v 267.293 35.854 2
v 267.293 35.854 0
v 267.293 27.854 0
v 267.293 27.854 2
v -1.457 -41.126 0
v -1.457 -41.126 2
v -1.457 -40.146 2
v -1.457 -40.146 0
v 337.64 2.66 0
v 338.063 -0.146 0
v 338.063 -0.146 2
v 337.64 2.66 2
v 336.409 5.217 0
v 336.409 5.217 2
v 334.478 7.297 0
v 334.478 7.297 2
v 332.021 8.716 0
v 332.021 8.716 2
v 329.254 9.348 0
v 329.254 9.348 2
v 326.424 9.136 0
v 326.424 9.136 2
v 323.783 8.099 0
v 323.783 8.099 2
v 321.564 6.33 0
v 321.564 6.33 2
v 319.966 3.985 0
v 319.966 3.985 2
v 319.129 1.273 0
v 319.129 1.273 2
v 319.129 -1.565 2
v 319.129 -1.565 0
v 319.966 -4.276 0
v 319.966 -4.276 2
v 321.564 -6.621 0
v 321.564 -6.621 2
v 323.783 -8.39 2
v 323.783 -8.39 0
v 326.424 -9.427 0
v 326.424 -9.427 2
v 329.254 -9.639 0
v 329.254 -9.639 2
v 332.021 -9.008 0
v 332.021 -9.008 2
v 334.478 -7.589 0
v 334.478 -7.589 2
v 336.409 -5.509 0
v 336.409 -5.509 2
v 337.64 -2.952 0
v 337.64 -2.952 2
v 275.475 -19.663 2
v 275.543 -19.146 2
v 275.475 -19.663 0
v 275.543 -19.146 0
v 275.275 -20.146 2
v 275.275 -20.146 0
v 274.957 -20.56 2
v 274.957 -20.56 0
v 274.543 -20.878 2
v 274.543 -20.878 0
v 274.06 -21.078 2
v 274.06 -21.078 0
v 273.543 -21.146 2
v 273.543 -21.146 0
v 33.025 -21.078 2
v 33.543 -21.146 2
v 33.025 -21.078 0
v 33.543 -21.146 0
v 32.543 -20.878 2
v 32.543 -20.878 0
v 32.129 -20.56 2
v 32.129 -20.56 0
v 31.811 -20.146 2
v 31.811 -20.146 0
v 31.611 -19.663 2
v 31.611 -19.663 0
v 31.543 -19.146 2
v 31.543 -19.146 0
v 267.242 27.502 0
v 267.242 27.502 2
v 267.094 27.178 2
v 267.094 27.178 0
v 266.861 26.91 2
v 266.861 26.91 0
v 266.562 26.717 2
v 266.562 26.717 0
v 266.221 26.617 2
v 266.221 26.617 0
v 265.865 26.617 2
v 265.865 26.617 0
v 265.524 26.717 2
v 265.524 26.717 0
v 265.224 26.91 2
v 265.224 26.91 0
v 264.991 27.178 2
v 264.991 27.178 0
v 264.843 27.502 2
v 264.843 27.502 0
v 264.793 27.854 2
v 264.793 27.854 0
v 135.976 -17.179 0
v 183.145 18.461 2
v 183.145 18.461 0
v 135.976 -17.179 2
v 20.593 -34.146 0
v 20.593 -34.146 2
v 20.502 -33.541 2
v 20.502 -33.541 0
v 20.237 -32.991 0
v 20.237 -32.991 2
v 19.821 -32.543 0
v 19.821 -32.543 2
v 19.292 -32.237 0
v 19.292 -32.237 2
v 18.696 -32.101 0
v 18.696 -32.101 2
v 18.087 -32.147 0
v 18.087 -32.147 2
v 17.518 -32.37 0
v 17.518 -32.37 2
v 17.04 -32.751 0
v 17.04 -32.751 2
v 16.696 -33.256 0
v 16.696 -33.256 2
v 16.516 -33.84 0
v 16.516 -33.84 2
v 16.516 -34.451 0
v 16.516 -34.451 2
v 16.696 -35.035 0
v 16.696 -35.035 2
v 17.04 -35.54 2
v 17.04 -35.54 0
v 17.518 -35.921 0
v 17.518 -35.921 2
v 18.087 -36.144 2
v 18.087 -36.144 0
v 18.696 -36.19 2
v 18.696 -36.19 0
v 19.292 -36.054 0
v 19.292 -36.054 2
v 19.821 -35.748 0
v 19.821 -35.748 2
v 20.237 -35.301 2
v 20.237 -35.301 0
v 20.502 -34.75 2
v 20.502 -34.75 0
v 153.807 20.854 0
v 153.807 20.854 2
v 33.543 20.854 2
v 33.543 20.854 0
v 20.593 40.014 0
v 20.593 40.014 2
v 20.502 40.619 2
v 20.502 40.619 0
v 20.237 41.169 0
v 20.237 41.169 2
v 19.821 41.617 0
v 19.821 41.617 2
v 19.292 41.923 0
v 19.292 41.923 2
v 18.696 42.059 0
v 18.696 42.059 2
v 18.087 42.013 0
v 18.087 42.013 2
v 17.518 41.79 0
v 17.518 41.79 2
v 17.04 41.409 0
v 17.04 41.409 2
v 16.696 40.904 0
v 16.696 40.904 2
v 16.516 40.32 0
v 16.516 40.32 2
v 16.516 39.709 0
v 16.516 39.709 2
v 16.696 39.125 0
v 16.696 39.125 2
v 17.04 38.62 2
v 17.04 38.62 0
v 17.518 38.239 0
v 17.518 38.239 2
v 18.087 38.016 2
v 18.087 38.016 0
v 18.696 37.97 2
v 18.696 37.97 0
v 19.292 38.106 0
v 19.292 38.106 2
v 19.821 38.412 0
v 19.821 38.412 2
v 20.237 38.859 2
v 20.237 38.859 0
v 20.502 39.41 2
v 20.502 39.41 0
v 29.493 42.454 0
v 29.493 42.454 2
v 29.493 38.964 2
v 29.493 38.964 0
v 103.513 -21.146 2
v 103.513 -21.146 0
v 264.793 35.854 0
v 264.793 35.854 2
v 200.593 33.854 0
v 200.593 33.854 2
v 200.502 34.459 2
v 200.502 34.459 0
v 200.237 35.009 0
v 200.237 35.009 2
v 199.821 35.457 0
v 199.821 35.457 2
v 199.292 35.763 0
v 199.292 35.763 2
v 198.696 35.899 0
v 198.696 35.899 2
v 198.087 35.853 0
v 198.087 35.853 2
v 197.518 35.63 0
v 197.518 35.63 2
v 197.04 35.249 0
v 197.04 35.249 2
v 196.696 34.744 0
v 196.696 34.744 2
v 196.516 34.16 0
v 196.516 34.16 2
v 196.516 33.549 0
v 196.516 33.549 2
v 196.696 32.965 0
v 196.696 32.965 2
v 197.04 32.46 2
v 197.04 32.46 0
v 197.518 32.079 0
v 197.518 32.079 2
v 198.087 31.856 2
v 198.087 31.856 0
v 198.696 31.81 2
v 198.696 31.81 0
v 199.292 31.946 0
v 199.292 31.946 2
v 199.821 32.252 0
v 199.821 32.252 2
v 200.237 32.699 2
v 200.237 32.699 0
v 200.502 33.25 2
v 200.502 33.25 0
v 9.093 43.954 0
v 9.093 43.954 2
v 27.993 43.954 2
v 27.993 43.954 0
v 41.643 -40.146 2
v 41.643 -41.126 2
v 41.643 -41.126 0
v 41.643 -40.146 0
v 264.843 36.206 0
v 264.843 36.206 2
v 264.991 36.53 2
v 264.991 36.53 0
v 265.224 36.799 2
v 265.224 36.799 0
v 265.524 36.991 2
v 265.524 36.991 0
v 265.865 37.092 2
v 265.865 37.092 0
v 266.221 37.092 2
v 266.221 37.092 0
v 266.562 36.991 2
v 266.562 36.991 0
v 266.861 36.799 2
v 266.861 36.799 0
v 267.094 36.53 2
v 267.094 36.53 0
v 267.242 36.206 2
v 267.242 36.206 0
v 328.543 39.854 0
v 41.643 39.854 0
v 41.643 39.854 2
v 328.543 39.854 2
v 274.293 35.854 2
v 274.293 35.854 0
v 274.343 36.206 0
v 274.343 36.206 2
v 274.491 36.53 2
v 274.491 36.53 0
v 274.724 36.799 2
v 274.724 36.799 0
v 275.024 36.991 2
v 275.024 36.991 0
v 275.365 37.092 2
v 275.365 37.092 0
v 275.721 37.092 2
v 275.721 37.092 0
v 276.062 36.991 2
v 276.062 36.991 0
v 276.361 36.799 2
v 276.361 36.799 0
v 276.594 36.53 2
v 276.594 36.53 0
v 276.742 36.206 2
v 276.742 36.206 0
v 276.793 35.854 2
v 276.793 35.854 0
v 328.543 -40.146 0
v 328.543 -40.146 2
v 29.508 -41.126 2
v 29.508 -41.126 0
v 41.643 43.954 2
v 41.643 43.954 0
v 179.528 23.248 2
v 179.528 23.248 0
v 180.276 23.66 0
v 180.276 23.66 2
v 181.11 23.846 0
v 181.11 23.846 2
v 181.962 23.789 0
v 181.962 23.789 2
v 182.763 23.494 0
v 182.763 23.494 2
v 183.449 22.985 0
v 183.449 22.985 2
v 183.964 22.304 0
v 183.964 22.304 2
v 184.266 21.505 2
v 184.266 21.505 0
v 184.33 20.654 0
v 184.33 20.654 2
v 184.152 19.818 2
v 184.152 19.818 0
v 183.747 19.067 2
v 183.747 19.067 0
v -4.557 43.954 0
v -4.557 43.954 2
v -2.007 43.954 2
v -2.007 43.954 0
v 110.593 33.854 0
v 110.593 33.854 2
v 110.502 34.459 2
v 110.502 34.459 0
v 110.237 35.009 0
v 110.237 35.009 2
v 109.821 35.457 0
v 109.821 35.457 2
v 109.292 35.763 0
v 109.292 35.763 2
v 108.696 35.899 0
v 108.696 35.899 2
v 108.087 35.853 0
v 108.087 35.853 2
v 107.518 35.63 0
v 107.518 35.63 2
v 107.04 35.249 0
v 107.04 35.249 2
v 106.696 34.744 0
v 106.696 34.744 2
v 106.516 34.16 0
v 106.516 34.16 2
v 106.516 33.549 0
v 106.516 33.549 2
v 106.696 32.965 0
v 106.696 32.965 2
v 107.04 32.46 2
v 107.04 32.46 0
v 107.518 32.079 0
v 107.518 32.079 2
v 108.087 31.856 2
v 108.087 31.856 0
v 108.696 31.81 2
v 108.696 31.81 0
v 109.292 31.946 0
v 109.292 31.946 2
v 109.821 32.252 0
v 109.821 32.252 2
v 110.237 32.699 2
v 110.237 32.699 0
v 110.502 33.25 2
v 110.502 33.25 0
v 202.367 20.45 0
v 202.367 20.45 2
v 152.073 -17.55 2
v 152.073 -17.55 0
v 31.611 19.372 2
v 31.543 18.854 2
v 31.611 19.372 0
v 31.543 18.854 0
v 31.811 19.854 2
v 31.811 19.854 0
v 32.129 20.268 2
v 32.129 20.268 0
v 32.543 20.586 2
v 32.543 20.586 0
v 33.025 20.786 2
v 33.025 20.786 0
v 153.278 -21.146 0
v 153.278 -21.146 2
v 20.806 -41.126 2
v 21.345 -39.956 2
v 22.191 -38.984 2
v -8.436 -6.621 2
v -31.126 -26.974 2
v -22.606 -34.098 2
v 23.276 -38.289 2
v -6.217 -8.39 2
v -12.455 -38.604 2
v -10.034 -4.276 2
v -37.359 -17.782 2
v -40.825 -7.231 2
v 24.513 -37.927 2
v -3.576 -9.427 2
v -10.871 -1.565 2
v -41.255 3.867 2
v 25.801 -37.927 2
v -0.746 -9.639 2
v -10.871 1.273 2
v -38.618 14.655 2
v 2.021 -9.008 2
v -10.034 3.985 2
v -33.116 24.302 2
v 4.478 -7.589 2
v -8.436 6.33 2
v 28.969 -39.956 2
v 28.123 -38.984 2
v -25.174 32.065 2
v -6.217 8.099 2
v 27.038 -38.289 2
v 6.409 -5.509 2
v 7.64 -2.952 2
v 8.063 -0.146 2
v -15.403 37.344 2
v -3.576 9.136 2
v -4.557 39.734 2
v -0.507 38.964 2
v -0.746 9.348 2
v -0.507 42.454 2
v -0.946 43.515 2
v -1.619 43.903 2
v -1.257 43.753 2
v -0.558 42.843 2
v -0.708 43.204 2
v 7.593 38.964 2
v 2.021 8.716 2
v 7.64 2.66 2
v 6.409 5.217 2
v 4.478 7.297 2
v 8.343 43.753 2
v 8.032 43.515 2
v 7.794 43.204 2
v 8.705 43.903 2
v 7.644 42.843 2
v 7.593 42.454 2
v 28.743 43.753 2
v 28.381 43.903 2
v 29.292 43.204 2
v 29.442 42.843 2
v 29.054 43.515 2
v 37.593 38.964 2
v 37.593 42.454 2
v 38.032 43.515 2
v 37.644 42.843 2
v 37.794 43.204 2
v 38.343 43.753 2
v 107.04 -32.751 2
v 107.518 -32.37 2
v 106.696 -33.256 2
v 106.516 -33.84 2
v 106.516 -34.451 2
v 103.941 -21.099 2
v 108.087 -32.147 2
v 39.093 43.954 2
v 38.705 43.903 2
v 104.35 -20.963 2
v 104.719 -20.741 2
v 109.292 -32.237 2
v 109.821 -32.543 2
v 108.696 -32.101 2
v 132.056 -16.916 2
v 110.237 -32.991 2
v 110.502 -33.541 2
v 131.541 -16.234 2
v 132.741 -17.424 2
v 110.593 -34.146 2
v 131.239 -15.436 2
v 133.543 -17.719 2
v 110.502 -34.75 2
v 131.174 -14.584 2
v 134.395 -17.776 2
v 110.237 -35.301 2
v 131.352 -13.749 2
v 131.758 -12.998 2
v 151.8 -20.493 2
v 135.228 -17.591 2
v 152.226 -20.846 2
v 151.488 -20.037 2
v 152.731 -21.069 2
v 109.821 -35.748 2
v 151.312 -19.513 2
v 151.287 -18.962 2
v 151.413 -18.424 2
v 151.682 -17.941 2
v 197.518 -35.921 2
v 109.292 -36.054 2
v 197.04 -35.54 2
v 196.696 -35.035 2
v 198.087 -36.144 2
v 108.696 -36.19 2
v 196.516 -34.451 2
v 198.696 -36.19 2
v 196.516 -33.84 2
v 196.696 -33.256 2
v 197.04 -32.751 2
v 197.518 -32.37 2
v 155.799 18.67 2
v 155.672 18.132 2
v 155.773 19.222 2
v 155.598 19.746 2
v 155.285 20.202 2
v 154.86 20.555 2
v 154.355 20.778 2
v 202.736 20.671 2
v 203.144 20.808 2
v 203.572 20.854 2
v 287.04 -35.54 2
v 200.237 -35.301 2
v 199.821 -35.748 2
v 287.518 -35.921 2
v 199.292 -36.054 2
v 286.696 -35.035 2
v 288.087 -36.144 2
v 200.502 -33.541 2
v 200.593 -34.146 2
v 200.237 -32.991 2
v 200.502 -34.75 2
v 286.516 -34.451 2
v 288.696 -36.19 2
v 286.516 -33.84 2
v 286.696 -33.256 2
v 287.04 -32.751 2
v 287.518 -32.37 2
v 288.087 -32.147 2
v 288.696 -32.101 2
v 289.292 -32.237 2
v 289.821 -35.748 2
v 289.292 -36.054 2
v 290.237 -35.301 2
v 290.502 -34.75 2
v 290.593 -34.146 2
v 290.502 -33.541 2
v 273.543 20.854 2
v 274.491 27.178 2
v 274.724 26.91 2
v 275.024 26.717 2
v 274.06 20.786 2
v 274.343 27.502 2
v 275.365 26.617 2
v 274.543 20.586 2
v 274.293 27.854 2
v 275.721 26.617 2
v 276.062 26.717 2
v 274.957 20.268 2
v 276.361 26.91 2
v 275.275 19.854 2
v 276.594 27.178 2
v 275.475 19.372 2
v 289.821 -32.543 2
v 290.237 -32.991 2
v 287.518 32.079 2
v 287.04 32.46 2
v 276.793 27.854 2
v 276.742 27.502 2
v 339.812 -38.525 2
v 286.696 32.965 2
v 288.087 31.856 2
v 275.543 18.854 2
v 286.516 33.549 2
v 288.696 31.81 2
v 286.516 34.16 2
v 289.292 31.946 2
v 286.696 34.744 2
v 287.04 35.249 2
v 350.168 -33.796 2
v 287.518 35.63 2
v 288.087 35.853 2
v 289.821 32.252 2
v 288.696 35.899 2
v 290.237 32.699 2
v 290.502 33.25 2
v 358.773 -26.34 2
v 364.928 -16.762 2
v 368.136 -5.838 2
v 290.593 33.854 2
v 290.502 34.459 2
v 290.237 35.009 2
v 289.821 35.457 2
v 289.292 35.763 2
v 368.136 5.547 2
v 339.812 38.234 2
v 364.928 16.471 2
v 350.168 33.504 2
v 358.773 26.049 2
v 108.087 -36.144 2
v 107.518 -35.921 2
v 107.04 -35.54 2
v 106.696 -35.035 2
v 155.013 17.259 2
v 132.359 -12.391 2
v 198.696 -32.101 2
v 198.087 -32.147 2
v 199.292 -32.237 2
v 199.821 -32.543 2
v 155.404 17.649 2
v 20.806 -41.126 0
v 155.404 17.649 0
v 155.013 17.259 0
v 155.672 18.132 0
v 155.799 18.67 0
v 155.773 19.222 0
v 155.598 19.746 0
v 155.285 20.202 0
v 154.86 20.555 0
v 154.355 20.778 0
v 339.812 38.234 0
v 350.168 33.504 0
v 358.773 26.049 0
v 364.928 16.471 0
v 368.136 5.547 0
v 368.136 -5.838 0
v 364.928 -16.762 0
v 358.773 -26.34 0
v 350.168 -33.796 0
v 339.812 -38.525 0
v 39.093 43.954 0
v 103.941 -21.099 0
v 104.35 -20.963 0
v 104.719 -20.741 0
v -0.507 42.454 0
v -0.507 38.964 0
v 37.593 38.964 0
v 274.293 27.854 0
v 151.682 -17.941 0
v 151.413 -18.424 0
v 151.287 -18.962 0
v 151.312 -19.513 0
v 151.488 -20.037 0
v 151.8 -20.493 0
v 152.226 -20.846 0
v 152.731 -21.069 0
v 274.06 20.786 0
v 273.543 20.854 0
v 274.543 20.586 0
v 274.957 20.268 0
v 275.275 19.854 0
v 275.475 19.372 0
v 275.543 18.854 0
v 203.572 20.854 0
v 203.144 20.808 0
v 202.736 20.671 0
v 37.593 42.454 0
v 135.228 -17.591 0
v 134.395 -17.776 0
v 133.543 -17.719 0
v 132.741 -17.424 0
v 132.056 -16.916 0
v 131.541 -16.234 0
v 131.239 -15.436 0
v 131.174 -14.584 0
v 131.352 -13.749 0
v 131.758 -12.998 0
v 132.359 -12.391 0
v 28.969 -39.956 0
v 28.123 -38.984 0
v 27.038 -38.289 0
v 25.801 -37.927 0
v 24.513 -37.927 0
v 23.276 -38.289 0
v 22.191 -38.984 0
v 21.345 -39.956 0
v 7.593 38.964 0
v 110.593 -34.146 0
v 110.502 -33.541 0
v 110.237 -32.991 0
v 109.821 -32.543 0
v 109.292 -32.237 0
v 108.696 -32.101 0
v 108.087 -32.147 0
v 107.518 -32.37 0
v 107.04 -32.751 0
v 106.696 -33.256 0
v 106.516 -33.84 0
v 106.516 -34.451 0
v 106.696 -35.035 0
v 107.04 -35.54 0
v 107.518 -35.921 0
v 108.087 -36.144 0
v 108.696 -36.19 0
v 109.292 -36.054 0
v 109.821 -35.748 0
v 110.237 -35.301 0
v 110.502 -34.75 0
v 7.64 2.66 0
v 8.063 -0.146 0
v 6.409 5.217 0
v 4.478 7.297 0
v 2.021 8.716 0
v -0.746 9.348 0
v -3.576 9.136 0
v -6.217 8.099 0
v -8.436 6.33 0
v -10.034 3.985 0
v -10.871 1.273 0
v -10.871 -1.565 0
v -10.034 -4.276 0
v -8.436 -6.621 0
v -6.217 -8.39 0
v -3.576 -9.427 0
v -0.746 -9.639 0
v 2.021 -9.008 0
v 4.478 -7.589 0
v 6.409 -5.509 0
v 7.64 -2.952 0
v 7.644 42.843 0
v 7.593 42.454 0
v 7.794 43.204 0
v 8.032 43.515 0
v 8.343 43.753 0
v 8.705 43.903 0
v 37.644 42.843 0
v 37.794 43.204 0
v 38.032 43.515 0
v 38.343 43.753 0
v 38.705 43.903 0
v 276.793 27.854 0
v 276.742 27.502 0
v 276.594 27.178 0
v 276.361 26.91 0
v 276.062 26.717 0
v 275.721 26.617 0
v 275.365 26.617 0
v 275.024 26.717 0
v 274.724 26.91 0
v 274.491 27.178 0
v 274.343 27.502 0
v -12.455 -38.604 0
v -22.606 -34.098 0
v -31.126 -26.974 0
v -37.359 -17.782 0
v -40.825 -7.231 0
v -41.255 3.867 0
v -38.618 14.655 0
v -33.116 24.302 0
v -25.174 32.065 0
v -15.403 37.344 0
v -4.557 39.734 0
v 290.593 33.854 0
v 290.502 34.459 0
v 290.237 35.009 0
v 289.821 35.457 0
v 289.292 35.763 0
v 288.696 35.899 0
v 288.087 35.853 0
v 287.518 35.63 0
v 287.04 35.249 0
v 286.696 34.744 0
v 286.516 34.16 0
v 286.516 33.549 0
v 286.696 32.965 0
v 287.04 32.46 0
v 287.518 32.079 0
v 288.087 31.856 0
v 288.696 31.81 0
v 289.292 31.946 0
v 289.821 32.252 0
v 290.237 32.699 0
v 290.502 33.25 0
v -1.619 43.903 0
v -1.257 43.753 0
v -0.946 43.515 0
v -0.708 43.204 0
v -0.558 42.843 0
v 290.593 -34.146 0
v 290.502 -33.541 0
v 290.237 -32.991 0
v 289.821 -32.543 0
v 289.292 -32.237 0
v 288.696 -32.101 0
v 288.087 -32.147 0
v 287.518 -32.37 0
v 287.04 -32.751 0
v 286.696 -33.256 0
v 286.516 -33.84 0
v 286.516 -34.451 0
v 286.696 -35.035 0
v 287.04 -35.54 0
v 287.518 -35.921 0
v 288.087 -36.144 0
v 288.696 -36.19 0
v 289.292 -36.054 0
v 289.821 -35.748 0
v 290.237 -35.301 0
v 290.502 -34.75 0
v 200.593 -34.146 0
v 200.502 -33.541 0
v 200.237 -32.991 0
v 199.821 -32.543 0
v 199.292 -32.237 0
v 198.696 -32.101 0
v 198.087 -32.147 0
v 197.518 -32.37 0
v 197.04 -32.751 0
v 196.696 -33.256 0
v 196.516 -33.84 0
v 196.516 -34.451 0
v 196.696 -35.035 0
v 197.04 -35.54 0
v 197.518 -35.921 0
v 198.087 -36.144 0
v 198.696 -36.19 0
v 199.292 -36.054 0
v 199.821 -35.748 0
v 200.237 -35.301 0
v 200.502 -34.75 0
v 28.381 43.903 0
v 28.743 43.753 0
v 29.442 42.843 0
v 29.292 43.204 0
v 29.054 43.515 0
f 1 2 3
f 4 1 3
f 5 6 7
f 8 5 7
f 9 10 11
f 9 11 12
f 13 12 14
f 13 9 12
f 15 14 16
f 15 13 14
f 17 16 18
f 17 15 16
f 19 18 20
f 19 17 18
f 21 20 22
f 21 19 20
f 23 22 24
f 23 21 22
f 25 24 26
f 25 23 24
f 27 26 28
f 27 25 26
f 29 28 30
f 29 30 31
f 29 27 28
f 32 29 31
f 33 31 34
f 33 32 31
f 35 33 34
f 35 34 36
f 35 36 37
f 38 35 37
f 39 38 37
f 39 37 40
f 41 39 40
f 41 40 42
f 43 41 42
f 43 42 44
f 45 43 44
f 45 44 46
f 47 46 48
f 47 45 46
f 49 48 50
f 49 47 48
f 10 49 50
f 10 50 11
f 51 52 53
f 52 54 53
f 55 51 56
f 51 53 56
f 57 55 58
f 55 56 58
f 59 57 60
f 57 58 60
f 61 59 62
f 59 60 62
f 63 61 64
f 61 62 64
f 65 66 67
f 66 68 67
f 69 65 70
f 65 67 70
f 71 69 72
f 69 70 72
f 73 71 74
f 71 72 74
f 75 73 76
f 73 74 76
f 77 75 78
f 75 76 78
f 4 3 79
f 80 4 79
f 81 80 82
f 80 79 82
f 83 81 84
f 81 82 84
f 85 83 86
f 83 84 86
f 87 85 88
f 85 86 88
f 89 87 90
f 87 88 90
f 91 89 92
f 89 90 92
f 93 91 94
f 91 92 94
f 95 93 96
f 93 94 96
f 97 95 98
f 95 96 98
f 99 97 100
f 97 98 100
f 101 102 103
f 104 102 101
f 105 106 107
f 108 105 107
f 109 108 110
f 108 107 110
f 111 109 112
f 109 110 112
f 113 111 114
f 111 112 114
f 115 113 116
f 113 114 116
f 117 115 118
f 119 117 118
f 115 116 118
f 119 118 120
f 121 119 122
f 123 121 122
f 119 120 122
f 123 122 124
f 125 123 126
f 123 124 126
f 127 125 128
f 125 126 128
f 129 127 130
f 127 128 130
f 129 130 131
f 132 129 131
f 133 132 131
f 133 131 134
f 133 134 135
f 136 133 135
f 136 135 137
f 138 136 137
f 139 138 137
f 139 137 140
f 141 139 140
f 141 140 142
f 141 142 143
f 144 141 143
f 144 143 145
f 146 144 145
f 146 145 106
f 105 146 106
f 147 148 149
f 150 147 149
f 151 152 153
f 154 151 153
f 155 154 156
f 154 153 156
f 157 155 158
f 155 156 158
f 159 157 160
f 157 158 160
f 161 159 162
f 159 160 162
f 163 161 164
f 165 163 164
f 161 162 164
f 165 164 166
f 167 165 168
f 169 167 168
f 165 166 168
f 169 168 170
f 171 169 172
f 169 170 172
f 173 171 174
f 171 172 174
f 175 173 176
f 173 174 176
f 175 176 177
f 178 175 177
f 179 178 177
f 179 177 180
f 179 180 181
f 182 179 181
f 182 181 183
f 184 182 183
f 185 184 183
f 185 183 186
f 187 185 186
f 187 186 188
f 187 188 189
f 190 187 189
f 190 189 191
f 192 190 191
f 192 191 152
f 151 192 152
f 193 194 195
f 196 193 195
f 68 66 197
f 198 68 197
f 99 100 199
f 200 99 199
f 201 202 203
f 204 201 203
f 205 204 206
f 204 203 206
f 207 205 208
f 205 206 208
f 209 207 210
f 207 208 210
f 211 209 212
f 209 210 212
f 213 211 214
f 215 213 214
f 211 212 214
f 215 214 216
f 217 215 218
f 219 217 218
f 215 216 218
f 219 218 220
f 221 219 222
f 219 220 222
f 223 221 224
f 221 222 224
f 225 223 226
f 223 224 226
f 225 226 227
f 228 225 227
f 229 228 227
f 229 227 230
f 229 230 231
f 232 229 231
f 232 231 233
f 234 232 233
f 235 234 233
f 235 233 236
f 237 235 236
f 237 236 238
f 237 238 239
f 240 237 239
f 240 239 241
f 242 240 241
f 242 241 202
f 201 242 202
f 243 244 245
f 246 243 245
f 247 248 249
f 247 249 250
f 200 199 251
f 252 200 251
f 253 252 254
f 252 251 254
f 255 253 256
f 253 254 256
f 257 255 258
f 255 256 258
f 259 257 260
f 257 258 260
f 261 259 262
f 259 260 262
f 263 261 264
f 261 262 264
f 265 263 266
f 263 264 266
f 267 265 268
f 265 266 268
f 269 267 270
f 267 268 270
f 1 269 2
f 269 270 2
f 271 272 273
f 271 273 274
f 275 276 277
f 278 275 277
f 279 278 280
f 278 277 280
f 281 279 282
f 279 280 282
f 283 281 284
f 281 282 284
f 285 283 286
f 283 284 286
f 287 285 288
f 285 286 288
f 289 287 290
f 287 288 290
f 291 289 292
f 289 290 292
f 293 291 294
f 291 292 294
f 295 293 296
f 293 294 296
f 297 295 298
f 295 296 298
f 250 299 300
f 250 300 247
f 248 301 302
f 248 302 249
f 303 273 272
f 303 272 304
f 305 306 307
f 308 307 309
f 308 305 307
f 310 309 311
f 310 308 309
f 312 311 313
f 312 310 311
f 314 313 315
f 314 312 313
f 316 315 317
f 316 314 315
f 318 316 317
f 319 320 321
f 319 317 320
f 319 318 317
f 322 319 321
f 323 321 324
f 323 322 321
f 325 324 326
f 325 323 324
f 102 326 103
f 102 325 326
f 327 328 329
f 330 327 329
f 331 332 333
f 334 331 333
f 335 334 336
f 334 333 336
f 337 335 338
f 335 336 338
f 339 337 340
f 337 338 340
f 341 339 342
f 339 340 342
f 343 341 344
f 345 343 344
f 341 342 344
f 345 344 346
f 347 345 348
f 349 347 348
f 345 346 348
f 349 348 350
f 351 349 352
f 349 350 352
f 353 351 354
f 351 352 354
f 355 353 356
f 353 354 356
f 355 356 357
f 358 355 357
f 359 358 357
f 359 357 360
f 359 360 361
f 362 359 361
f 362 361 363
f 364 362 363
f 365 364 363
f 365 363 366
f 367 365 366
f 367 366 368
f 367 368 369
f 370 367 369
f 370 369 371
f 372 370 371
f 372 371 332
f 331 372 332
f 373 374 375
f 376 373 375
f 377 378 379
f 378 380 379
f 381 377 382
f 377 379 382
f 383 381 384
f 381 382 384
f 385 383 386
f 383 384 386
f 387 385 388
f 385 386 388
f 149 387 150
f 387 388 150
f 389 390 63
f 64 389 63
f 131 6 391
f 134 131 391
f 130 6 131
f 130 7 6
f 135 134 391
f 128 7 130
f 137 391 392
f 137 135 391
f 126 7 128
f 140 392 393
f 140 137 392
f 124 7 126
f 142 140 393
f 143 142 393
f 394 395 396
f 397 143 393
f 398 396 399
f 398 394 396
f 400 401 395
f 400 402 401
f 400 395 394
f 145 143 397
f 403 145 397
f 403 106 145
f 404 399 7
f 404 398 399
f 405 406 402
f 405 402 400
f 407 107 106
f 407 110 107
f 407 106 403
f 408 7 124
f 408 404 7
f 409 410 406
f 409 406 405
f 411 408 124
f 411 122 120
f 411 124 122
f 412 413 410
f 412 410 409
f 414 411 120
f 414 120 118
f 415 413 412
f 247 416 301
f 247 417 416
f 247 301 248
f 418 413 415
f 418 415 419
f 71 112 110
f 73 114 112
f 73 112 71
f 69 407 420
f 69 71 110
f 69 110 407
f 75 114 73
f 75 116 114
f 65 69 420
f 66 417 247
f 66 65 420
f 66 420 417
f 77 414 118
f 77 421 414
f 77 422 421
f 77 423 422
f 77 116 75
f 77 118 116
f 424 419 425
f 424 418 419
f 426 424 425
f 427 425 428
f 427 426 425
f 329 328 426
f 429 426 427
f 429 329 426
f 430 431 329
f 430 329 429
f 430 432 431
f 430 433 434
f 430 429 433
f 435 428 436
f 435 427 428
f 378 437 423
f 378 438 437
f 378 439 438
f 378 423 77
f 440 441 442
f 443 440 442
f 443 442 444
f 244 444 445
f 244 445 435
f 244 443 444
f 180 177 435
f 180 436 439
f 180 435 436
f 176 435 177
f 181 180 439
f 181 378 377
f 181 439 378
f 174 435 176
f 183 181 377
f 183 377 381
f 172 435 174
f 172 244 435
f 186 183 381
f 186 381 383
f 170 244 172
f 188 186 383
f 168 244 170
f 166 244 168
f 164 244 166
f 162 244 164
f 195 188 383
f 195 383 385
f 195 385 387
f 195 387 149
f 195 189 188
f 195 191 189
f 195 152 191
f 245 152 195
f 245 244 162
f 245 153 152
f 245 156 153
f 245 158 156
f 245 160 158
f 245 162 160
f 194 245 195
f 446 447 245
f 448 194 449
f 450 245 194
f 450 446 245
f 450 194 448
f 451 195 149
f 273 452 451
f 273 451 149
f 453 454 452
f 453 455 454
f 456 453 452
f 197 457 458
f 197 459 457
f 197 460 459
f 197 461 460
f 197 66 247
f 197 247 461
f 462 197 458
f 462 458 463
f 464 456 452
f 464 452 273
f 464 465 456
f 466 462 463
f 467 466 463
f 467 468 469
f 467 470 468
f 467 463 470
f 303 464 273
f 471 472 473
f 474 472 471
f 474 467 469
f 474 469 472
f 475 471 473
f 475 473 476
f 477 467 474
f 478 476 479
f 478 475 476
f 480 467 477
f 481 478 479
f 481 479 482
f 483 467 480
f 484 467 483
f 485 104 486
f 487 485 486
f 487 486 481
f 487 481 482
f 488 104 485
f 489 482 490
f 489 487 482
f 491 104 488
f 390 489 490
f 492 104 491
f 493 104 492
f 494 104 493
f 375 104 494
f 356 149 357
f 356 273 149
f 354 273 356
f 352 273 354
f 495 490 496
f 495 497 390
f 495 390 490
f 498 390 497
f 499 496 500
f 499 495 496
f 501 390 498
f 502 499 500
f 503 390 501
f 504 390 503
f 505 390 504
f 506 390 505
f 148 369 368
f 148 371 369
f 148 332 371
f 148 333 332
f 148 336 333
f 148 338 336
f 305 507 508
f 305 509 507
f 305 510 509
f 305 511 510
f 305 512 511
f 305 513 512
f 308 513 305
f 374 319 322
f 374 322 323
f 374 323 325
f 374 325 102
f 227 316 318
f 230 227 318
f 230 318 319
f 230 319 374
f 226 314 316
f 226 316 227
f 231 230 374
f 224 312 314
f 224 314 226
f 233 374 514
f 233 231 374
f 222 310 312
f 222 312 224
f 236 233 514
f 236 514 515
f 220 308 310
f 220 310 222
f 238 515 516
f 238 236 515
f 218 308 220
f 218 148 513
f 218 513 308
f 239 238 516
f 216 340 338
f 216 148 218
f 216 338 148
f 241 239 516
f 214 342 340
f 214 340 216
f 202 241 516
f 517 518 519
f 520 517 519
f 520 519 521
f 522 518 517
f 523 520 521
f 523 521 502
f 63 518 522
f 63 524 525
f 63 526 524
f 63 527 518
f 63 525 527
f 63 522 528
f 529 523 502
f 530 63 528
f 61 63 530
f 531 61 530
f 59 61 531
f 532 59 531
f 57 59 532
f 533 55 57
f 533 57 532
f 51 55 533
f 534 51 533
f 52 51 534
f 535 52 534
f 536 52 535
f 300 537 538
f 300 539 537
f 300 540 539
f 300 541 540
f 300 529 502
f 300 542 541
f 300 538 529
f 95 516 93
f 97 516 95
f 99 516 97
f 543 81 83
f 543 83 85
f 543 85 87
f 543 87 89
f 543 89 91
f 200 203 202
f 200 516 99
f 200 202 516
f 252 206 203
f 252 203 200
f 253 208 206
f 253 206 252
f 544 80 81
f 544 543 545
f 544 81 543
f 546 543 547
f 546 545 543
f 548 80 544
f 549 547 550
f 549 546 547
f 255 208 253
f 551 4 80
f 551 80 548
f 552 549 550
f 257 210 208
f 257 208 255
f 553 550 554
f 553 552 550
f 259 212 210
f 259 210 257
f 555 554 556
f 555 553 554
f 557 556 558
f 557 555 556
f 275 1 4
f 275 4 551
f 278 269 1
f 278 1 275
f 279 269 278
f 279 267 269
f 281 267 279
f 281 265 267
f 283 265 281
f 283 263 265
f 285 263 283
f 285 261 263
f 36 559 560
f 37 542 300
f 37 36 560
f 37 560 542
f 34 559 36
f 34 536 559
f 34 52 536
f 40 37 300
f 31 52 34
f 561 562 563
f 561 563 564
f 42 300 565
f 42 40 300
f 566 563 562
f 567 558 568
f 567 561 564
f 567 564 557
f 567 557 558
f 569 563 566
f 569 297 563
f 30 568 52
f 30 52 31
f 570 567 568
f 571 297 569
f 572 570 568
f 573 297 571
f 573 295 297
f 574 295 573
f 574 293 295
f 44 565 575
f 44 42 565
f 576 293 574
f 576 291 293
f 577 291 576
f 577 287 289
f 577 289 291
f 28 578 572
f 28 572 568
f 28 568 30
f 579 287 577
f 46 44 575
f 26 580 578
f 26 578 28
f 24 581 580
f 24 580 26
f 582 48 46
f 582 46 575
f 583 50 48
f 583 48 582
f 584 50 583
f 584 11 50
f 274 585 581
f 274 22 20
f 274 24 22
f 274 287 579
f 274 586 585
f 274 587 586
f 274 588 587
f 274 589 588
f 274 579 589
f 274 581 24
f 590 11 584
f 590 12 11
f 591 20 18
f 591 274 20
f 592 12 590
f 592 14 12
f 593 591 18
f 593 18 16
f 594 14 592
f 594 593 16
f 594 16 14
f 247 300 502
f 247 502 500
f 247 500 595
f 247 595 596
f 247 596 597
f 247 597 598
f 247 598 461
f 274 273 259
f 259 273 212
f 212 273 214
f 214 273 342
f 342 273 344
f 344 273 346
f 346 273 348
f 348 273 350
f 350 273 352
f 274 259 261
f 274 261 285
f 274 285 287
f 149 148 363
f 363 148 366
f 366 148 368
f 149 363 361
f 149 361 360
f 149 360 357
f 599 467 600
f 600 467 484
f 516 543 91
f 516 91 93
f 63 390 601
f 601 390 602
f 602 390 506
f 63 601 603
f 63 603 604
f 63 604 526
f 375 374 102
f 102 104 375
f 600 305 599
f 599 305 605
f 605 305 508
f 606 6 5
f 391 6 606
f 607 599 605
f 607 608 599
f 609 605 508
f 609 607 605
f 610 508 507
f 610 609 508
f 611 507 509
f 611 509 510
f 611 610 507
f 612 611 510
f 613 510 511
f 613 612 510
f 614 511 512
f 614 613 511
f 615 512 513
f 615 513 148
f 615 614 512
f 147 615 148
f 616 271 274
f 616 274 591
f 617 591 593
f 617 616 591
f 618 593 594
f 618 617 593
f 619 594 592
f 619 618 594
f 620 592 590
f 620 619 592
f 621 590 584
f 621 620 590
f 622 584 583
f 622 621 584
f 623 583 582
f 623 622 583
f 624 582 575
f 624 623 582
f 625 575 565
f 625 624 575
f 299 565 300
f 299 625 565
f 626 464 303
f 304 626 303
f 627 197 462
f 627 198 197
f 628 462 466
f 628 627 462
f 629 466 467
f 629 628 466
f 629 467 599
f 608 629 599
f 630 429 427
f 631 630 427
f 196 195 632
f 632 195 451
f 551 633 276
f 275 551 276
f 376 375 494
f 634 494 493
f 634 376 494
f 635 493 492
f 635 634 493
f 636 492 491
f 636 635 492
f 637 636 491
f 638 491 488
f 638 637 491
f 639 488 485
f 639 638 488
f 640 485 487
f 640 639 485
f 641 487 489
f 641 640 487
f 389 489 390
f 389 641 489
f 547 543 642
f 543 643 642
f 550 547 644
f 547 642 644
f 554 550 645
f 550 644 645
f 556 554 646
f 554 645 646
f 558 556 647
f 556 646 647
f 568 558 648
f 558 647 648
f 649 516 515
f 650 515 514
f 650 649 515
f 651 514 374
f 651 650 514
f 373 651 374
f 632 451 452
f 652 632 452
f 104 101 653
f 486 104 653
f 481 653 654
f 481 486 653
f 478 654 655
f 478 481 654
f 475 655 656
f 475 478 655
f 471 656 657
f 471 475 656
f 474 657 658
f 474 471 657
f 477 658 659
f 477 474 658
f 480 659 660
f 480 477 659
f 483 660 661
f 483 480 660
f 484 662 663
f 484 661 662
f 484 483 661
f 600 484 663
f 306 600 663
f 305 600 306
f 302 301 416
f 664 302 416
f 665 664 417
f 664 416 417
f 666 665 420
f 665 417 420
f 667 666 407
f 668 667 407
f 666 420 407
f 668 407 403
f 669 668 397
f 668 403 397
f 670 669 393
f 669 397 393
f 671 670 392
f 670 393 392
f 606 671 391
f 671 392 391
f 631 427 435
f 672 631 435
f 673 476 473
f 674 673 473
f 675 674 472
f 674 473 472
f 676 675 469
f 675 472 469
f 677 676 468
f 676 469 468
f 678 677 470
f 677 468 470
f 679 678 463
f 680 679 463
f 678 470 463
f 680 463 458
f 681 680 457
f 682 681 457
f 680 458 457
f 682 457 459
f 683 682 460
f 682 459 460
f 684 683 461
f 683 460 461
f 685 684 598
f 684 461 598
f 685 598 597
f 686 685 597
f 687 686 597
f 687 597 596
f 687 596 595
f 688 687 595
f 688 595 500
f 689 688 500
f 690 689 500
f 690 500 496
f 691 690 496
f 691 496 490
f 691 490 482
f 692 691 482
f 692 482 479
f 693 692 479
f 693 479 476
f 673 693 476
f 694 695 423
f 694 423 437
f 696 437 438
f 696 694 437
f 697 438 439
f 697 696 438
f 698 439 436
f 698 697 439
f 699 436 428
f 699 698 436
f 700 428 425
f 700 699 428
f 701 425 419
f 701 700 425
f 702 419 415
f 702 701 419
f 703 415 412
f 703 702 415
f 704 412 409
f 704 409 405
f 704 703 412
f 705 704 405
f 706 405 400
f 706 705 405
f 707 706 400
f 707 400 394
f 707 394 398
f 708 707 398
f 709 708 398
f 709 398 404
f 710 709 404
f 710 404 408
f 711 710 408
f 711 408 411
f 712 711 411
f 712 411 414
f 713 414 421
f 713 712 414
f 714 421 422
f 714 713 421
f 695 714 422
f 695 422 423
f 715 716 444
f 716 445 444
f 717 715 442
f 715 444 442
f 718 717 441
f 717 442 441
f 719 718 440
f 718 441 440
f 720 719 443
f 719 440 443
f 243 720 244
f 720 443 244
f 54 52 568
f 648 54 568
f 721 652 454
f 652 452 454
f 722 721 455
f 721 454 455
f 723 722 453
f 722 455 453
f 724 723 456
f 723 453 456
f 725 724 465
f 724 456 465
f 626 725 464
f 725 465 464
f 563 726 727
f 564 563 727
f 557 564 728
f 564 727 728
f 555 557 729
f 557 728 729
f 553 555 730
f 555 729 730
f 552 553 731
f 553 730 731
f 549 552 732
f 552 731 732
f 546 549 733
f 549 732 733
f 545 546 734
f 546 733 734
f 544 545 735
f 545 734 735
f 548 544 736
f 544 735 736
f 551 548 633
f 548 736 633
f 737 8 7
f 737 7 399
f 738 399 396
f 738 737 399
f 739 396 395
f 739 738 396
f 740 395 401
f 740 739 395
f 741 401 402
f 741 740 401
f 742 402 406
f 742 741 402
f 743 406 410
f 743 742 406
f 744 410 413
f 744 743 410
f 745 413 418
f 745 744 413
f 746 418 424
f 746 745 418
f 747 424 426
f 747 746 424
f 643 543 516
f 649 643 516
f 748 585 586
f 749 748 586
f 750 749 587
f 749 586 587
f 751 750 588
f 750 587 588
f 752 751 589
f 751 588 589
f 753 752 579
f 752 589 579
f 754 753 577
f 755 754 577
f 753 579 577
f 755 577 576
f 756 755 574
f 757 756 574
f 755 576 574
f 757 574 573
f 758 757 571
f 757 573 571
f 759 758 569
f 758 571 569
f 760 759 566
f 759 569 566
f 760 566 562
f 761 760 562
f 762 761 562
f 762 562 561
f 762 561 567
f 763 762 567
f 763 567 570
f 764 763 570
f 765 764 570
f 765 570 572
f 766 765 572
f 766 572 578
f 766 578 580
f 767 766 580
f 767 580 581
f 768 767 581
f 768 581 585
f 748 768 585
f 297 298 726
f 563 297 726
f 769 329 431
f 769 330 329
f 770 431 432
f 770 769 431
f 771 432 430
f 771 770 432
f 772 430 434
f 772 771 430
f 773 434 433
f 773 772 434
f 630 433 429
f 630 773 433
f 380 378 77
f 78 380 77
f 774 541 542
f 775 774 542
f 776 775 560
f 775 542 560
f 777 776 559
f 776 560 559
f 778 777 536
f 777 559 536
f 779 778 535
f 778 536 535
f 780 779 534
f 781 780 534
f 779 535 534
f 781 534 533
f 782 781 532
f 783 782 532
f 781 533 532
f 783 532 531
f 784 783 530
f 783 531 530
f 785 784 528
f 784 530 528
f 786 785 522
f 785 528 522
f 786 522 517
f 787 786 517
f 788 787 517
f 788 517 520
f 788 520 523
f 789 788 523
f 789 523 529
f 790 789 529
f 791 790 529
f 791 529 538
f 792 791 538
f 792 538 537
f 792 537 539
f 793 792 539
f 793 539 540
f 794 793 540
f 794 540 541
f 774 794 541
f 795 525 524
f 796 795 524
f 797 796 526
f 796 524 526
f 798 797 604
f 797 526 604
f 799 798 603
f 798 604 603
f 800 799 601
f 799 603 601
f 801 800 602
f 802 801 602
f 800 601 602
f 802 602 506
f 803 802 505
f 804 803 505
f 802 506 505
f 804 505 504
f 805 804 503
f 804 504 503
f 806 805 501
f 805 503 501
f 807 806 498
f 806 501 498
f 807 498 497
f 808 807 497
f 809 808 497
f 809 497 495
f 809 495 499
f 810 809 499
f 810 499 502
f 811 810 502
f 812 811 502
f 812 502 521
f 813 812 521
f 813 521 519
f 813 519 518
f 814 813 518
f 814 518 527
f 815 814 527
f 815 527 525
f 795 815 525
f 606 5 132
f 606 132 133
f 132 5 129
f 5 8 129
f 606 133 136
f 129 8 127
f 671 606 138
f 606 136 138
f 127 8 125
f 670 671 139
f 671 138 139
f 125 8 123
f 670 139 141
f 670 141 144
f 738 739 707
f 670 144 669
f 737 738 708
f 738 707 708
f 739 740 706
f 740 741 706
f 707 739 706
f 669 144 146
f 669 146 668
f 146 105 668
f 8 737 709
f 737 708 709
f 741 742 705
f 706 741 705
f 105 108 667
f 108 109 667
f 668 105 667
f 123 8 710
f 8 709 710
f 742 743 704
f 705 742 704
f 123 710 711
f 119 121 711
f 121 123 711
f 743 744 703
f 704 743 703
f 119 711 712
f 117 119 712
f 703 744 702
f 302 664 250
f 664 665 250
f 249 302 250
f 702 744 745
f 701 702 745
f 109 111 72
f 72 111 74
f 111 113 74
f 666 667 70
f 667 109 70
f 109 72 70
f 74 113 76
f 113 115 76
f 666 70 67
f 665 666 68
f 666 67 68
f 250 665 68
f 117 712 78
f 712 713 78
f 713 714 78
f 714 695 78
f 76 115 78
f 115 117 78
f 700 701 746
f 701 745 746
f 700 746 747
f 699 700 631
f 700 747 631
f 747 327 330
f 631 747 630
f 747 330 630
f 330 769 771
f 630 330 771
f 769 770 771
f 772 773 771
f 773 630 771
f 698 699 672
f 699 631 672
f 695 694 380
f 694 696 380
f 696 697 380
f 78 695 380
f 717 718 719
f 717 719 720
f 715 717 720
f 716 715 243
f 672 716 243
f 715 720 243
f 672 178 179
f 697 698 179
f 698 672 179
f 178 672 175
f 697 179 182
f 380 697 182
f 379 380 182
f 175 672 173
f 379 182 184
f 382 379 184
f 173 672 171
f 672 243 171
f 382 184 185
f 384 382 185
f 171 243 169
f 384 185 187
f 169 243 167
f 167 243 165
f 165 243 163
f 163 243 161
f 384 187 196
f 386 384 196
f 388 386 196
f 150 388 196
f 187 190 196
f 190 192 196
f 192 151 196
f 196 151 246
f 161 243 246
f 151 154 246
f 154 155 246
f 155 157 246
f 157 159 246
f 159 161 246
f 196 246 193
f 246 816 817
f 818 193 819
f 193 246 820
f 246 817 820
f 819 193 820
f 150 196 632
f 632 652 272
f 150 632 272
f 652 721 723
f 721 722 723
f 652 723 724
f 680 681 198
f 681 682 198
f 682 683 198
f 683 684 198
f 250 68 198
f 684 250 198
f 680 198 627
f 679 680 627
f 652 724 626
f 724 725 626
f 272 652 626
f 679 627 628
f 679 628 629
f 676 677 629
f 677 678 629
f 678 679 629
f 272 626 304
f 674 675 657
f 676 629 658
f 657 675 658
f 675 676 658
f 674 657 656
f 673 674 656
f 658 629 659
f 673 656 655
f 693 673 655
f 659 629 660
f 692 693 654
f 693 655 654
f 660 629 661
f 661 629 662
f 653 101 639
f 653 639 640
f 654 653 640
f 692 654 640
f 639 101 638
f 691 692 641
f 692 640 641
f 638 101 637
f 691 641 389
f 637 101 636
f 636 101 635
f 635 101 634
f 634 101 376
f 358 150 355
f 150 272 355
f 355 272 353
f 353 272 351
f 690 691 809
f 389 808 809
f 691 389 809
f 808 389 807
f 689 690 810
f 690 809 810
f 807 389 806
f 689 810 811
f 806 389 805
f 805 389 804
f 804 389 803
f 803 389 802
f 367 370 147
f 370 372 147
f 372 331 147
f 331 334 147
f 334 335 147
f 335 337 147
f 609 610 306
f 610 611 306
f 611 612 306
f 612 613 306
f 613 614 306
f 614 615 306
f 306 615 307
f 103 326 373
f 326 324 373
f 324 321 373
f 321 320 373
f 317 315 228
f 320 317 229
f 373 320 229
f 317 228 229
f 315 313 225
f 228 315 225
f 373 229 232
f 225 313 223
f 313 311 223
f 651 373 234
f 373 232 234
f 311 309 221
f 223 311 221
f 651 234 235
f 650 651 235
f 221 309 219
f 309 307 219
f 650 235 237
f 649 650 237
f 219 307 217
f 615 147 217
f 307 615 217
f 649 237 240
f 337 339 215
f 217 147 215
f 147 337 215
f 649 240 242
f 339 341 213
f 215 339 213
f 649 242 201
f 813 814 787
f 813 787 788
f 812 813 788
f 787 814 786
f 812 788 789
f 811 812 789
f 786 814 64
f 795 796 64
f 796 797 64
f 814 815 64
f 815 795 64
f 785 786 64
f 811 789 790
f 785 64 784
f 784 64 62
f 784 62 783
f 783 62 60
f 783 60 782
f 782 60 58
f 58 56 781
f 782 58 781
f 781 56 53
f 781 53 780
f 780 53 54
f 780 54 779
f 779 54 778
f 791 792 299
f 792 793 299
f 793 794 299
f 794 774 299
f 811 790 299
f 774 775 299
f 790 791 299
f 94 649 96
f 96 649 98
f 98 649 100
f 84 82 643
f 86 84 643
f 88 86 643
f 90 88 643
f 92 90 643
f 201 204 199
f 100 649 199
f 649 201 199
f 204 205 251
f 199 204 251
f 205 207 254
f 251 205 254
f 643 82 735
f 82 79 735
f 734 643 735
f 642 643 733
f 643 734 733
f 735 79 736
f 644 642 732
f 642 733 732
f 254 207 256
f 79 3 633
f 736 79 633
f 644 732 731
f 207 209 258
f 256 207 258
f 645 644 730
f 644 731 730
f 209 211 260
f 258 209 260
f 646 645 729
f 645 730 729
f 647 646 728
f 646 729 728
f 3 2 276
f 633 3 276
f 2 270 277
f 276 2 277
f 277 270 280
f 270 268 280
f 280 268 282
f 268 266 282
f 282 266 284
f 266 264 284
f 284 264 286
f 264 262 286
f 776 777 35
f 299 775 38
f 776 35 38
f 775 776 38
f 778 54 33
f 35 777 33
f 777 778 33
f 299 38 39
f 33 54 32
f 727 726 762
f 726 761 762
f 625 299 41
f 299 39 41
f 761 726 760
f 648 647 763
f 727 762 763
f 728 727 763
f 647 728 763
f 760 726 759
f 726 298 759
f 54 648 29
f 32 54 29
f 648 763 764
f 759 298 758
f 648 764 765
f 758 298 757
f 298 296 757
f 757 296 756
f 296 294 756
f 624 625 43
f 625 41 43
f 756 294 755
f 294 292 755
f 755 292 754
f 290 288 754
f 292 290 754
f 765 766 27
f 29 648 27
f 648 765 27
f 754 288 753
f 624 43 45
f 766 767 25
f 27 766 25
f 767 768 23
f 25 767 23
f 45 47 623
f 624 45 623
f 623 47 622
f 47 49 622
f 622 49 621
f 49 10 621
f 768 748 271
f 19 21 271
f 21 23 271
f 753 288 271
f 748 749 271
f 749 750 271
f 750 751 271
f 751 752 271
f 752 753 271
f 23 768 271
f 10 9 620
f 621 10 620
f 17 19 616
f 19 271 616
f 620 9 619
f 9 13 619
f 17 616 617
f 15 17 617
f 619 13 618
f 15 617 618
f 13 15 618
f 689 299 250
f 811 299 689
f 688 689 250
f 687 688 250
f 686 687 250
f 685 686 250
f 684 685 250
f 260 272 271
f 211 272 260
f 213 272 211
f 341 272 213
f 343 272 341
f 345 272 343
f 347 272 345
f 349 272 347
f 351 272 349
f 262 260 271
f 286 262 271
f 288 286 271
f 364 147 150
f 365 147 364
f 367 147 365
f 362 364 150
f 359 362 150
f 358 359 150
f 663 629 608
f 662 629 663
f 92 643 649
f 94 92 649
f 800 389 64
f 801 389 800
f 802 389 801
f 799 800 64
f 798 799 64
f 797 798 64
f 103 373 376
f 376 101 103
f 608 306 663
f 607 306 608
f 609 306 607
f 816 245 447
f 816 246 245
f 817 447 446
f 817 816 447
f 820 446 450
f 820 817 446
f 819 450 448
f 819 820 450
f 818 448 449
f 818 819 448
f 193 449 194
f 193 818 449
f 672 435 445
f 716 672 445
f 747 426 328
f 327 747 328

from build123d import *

# Parameters (mm, degrees)
SKETCH_1_R          = 9.52
EXTRUDE_1_DEPTH     = 2
SKETCH_4_W          = 43.1
SKETCH_4_H          = 0.98
SKETCH_4_W_2        = 46.2
SKETCH_4_H_2        = 8.602857229
EXTRUDE_2_DEPTH     = 2
SKETCH_2_R          = 2.05
CUT_EXTRUDE_1_DEPTH = 4
CUT_EXTRUDE_2_DEPTH = 10
FILLET_1_R          = 2
CUT_EXTRUDE_3_DEPTH = 2
FILLET_2_R          = 1.5


with BuildPart() as part:
    # 草图1 → 凸台-拉伸1 (new body)
    with BuildSketch(Plane.XY):
        with BuildLine():
            Line((328.542857143, -40.145714286), (-1.457142857, -40.145714286))
            ThreePointArc((-1.457142857, -40.145714286), (-41.457142857, -0.145714286), (-1.457142857, 39.854285714))
            Line((-1.457142857, 39.854285714), (328.542857143, 39.854285714))
            ThreePointArc((328.542857143, 39.854285714), (368.542857143, -0.145714286), (328.542857143, -40.145714286))
        make_face()
        with Locations((-1.457142857, -0.145714286)):
            Circle(SKETCH_1_R, mode=Mode.SUBTRACT)
        with Locations((328.542857143, -0.145714286)):
            Circle(SKETCH_1_R, mode=Mode.SUBTRACT)
        with BuildLine():
            Line((276.792857143, 35.854285714), (276.792857143, 27.854285714))
            ThreePointArc((276.792857143, 27.854285714), (275.542857143, 26.604285714), (274.292857143, 27.854285714))
            Line((274.292857143, 27.854285714), (274.292857143, 35.854285714))
            ThreePointArc((274.292857143, 35.854285714), (275.542857143, 37.104285714), (276.792857143, 35.854285714))
        make_face(mode=Mode.SUBTRACT)
        with BuildLine():
            Line((264.792857143, 27.854285714), (264.792857143, 35.854285714))
            ThreePointArc((264.792857143, 35.854285714), (266.042857143, 37.104285714), (267.292857143, 35.854285714))
            Line((267.292857143, 35.854285714), (267.292857143, 27.854285714))
            ThreePointArc((267.292857143, 27.854285714), (266.042857143, 26.604285714), (264.792857143, 27.854285714))
        make_face(mode=Mode.SUBTRACT)
    extrude(amount=EXTRUDE_1_DEPTH)

    # 草图4 → 凸台-拉伸2 (add)
    with BuildSketch(Plane.XY.offset(2)):
        with Locations((20.092857143, -40.635714286)):
            Rectangle(SKETCH_4_W, SKETCH_4_H)
        with Locations((18.542857143, 39.652857099)):
            Rectangle(SKETCH_4_W_2, SKETCH_4_H_2)
    extrude(amount=-EXTRUDE_2_DEPTH)

    # 草图2 → 切除-拉伸1 (cut)
    with BuildSketch(Plane.XY.offset(2)):
        with Locations((108.542857143, 33.854285714)):
            Circle(SKETCH_2_R)
        with Locations((198.542857143, 33.854285714)):
            Circle(SKETCH_2_R)
        with Locations((288.542857143, 33.854285714)):
            Circle(SKETCH_2_R)
        with Locations((108.542857143, -34.145714286)):
            Circle(SKETCH_2_R)
        with Locations((198.542857143, -34.145714286)):
            Circle(SKETCH_2_R)
        with Locations((288.542857143, -34.145714286)):
            Circle(SKETCH_2_R)
        with Locations((18.542857143, -34.145714286)):
            Circle(SKETCH_2_R)
        with Locations((18.542857143, 40.014285714)):
            Circle(SKETCH_2_R)
        Polygon((31.542857143, -21.145714286), (104.183898028, -21.145714286), (159.772133322, 20.854285714), (31.542857143, 20.854285714), align=None)
        Polygon((275.542857143, 20.854285714), (202.901816258, 20.854285714), (147.313580964, -21.145714286), (275.542857143, -21.145714286), align=None)
        Polygon((29.492857143, 41.064285714), (29.492857143, 38.964285714), (37.592857143, 38.964285714), (37.592857143, 41.064285714), (37.592857143, 53.579710622), (29.492857143, 53.579710622), align=None)
        Polygon((-0.507142857, 41.064285714), (-0.507142857, 38.964285714), (7.592857143, 38.964285714), (7.592857143, 41.064285714), (7.592857143, 53.579710622), (-0.507142857, 53.579710622), align=None)
    extrude(amount=-CUT_EXTRUDE_1_DEPTH, mode=Mode.SUBTRACT)

    # 草图3 → 切除-拉伸2 (cut)
    with BuildSketch(Plane.XY.offset(2)):
        with BuildLine():
            Line((183.145474057, 18.460683743), (135.97586329, -17.178577727))
            ThreePointArc((135.97586329, -17.178577727), (131.77376205, -16.593475022), (132.358864754, -12.391373783))
            Line((132.358864754, -12.391373783), (179.528475522, 23.247887686))
            ThreePointArc((179.528475522, 23.247887686), (183.730576762, 22.662784982), (183.145474057, 18.460683743))
        make_face()
    extrude(amount=-CUT_EXTRUDE_2_DEPTH, mode=Mode.SUBTRACT)

    # 圆角1
    fillet_1_edges = [part.edges().sort_by_distance(p)[0] for p in [
        (275.542857143, 20.854285714, 1),
        (275.542857143, -21.145714286, 1),
        (147.313580964, -21.145714286, 1),
        (202.901816258, 20.854285714, 1),
        (31.542857143, -21.145714286, 1),
        (31.542857143, 20.854285714, 1),
        (159.772133322, 20.854285714, 1),
        (104.183898028, -21.145714286, 1),
    ]]
    fillet(fillet_1_edges, radius=FILLET_1_R)

    # 草图5 → 切除-拉伸3 (cut)
    with BuildSketch(Plane.XY.offset(2)):
        with BuildLine():
            Line((20.806207352, -41.125714286), (29.507867411, -41.125714286))
            ThreePointArc((29.507867411, -41.125714286), (25.157037382, -37.88123609), (20.806207352, -41.125714286))
        make_face()
    extrude(amount=-CUT_EXTRUDE_3_DEPTH, mode=Mode.SUBTRACT)

    # 圆角2
    fillet_2_edges = [part.edges().sort_by_distance(p)[0] for p in [
        (37.592857143, 43.954285714, 1),
        (29.492857143, 43.954285714, 1),
        (-0.507142857, 43.954285714, 1),
        (7.592857143, 43.954285714, 1),
    ]]
    fillet(fillet_2_edges, radius=FILLET_2_R)


solid = part.part
